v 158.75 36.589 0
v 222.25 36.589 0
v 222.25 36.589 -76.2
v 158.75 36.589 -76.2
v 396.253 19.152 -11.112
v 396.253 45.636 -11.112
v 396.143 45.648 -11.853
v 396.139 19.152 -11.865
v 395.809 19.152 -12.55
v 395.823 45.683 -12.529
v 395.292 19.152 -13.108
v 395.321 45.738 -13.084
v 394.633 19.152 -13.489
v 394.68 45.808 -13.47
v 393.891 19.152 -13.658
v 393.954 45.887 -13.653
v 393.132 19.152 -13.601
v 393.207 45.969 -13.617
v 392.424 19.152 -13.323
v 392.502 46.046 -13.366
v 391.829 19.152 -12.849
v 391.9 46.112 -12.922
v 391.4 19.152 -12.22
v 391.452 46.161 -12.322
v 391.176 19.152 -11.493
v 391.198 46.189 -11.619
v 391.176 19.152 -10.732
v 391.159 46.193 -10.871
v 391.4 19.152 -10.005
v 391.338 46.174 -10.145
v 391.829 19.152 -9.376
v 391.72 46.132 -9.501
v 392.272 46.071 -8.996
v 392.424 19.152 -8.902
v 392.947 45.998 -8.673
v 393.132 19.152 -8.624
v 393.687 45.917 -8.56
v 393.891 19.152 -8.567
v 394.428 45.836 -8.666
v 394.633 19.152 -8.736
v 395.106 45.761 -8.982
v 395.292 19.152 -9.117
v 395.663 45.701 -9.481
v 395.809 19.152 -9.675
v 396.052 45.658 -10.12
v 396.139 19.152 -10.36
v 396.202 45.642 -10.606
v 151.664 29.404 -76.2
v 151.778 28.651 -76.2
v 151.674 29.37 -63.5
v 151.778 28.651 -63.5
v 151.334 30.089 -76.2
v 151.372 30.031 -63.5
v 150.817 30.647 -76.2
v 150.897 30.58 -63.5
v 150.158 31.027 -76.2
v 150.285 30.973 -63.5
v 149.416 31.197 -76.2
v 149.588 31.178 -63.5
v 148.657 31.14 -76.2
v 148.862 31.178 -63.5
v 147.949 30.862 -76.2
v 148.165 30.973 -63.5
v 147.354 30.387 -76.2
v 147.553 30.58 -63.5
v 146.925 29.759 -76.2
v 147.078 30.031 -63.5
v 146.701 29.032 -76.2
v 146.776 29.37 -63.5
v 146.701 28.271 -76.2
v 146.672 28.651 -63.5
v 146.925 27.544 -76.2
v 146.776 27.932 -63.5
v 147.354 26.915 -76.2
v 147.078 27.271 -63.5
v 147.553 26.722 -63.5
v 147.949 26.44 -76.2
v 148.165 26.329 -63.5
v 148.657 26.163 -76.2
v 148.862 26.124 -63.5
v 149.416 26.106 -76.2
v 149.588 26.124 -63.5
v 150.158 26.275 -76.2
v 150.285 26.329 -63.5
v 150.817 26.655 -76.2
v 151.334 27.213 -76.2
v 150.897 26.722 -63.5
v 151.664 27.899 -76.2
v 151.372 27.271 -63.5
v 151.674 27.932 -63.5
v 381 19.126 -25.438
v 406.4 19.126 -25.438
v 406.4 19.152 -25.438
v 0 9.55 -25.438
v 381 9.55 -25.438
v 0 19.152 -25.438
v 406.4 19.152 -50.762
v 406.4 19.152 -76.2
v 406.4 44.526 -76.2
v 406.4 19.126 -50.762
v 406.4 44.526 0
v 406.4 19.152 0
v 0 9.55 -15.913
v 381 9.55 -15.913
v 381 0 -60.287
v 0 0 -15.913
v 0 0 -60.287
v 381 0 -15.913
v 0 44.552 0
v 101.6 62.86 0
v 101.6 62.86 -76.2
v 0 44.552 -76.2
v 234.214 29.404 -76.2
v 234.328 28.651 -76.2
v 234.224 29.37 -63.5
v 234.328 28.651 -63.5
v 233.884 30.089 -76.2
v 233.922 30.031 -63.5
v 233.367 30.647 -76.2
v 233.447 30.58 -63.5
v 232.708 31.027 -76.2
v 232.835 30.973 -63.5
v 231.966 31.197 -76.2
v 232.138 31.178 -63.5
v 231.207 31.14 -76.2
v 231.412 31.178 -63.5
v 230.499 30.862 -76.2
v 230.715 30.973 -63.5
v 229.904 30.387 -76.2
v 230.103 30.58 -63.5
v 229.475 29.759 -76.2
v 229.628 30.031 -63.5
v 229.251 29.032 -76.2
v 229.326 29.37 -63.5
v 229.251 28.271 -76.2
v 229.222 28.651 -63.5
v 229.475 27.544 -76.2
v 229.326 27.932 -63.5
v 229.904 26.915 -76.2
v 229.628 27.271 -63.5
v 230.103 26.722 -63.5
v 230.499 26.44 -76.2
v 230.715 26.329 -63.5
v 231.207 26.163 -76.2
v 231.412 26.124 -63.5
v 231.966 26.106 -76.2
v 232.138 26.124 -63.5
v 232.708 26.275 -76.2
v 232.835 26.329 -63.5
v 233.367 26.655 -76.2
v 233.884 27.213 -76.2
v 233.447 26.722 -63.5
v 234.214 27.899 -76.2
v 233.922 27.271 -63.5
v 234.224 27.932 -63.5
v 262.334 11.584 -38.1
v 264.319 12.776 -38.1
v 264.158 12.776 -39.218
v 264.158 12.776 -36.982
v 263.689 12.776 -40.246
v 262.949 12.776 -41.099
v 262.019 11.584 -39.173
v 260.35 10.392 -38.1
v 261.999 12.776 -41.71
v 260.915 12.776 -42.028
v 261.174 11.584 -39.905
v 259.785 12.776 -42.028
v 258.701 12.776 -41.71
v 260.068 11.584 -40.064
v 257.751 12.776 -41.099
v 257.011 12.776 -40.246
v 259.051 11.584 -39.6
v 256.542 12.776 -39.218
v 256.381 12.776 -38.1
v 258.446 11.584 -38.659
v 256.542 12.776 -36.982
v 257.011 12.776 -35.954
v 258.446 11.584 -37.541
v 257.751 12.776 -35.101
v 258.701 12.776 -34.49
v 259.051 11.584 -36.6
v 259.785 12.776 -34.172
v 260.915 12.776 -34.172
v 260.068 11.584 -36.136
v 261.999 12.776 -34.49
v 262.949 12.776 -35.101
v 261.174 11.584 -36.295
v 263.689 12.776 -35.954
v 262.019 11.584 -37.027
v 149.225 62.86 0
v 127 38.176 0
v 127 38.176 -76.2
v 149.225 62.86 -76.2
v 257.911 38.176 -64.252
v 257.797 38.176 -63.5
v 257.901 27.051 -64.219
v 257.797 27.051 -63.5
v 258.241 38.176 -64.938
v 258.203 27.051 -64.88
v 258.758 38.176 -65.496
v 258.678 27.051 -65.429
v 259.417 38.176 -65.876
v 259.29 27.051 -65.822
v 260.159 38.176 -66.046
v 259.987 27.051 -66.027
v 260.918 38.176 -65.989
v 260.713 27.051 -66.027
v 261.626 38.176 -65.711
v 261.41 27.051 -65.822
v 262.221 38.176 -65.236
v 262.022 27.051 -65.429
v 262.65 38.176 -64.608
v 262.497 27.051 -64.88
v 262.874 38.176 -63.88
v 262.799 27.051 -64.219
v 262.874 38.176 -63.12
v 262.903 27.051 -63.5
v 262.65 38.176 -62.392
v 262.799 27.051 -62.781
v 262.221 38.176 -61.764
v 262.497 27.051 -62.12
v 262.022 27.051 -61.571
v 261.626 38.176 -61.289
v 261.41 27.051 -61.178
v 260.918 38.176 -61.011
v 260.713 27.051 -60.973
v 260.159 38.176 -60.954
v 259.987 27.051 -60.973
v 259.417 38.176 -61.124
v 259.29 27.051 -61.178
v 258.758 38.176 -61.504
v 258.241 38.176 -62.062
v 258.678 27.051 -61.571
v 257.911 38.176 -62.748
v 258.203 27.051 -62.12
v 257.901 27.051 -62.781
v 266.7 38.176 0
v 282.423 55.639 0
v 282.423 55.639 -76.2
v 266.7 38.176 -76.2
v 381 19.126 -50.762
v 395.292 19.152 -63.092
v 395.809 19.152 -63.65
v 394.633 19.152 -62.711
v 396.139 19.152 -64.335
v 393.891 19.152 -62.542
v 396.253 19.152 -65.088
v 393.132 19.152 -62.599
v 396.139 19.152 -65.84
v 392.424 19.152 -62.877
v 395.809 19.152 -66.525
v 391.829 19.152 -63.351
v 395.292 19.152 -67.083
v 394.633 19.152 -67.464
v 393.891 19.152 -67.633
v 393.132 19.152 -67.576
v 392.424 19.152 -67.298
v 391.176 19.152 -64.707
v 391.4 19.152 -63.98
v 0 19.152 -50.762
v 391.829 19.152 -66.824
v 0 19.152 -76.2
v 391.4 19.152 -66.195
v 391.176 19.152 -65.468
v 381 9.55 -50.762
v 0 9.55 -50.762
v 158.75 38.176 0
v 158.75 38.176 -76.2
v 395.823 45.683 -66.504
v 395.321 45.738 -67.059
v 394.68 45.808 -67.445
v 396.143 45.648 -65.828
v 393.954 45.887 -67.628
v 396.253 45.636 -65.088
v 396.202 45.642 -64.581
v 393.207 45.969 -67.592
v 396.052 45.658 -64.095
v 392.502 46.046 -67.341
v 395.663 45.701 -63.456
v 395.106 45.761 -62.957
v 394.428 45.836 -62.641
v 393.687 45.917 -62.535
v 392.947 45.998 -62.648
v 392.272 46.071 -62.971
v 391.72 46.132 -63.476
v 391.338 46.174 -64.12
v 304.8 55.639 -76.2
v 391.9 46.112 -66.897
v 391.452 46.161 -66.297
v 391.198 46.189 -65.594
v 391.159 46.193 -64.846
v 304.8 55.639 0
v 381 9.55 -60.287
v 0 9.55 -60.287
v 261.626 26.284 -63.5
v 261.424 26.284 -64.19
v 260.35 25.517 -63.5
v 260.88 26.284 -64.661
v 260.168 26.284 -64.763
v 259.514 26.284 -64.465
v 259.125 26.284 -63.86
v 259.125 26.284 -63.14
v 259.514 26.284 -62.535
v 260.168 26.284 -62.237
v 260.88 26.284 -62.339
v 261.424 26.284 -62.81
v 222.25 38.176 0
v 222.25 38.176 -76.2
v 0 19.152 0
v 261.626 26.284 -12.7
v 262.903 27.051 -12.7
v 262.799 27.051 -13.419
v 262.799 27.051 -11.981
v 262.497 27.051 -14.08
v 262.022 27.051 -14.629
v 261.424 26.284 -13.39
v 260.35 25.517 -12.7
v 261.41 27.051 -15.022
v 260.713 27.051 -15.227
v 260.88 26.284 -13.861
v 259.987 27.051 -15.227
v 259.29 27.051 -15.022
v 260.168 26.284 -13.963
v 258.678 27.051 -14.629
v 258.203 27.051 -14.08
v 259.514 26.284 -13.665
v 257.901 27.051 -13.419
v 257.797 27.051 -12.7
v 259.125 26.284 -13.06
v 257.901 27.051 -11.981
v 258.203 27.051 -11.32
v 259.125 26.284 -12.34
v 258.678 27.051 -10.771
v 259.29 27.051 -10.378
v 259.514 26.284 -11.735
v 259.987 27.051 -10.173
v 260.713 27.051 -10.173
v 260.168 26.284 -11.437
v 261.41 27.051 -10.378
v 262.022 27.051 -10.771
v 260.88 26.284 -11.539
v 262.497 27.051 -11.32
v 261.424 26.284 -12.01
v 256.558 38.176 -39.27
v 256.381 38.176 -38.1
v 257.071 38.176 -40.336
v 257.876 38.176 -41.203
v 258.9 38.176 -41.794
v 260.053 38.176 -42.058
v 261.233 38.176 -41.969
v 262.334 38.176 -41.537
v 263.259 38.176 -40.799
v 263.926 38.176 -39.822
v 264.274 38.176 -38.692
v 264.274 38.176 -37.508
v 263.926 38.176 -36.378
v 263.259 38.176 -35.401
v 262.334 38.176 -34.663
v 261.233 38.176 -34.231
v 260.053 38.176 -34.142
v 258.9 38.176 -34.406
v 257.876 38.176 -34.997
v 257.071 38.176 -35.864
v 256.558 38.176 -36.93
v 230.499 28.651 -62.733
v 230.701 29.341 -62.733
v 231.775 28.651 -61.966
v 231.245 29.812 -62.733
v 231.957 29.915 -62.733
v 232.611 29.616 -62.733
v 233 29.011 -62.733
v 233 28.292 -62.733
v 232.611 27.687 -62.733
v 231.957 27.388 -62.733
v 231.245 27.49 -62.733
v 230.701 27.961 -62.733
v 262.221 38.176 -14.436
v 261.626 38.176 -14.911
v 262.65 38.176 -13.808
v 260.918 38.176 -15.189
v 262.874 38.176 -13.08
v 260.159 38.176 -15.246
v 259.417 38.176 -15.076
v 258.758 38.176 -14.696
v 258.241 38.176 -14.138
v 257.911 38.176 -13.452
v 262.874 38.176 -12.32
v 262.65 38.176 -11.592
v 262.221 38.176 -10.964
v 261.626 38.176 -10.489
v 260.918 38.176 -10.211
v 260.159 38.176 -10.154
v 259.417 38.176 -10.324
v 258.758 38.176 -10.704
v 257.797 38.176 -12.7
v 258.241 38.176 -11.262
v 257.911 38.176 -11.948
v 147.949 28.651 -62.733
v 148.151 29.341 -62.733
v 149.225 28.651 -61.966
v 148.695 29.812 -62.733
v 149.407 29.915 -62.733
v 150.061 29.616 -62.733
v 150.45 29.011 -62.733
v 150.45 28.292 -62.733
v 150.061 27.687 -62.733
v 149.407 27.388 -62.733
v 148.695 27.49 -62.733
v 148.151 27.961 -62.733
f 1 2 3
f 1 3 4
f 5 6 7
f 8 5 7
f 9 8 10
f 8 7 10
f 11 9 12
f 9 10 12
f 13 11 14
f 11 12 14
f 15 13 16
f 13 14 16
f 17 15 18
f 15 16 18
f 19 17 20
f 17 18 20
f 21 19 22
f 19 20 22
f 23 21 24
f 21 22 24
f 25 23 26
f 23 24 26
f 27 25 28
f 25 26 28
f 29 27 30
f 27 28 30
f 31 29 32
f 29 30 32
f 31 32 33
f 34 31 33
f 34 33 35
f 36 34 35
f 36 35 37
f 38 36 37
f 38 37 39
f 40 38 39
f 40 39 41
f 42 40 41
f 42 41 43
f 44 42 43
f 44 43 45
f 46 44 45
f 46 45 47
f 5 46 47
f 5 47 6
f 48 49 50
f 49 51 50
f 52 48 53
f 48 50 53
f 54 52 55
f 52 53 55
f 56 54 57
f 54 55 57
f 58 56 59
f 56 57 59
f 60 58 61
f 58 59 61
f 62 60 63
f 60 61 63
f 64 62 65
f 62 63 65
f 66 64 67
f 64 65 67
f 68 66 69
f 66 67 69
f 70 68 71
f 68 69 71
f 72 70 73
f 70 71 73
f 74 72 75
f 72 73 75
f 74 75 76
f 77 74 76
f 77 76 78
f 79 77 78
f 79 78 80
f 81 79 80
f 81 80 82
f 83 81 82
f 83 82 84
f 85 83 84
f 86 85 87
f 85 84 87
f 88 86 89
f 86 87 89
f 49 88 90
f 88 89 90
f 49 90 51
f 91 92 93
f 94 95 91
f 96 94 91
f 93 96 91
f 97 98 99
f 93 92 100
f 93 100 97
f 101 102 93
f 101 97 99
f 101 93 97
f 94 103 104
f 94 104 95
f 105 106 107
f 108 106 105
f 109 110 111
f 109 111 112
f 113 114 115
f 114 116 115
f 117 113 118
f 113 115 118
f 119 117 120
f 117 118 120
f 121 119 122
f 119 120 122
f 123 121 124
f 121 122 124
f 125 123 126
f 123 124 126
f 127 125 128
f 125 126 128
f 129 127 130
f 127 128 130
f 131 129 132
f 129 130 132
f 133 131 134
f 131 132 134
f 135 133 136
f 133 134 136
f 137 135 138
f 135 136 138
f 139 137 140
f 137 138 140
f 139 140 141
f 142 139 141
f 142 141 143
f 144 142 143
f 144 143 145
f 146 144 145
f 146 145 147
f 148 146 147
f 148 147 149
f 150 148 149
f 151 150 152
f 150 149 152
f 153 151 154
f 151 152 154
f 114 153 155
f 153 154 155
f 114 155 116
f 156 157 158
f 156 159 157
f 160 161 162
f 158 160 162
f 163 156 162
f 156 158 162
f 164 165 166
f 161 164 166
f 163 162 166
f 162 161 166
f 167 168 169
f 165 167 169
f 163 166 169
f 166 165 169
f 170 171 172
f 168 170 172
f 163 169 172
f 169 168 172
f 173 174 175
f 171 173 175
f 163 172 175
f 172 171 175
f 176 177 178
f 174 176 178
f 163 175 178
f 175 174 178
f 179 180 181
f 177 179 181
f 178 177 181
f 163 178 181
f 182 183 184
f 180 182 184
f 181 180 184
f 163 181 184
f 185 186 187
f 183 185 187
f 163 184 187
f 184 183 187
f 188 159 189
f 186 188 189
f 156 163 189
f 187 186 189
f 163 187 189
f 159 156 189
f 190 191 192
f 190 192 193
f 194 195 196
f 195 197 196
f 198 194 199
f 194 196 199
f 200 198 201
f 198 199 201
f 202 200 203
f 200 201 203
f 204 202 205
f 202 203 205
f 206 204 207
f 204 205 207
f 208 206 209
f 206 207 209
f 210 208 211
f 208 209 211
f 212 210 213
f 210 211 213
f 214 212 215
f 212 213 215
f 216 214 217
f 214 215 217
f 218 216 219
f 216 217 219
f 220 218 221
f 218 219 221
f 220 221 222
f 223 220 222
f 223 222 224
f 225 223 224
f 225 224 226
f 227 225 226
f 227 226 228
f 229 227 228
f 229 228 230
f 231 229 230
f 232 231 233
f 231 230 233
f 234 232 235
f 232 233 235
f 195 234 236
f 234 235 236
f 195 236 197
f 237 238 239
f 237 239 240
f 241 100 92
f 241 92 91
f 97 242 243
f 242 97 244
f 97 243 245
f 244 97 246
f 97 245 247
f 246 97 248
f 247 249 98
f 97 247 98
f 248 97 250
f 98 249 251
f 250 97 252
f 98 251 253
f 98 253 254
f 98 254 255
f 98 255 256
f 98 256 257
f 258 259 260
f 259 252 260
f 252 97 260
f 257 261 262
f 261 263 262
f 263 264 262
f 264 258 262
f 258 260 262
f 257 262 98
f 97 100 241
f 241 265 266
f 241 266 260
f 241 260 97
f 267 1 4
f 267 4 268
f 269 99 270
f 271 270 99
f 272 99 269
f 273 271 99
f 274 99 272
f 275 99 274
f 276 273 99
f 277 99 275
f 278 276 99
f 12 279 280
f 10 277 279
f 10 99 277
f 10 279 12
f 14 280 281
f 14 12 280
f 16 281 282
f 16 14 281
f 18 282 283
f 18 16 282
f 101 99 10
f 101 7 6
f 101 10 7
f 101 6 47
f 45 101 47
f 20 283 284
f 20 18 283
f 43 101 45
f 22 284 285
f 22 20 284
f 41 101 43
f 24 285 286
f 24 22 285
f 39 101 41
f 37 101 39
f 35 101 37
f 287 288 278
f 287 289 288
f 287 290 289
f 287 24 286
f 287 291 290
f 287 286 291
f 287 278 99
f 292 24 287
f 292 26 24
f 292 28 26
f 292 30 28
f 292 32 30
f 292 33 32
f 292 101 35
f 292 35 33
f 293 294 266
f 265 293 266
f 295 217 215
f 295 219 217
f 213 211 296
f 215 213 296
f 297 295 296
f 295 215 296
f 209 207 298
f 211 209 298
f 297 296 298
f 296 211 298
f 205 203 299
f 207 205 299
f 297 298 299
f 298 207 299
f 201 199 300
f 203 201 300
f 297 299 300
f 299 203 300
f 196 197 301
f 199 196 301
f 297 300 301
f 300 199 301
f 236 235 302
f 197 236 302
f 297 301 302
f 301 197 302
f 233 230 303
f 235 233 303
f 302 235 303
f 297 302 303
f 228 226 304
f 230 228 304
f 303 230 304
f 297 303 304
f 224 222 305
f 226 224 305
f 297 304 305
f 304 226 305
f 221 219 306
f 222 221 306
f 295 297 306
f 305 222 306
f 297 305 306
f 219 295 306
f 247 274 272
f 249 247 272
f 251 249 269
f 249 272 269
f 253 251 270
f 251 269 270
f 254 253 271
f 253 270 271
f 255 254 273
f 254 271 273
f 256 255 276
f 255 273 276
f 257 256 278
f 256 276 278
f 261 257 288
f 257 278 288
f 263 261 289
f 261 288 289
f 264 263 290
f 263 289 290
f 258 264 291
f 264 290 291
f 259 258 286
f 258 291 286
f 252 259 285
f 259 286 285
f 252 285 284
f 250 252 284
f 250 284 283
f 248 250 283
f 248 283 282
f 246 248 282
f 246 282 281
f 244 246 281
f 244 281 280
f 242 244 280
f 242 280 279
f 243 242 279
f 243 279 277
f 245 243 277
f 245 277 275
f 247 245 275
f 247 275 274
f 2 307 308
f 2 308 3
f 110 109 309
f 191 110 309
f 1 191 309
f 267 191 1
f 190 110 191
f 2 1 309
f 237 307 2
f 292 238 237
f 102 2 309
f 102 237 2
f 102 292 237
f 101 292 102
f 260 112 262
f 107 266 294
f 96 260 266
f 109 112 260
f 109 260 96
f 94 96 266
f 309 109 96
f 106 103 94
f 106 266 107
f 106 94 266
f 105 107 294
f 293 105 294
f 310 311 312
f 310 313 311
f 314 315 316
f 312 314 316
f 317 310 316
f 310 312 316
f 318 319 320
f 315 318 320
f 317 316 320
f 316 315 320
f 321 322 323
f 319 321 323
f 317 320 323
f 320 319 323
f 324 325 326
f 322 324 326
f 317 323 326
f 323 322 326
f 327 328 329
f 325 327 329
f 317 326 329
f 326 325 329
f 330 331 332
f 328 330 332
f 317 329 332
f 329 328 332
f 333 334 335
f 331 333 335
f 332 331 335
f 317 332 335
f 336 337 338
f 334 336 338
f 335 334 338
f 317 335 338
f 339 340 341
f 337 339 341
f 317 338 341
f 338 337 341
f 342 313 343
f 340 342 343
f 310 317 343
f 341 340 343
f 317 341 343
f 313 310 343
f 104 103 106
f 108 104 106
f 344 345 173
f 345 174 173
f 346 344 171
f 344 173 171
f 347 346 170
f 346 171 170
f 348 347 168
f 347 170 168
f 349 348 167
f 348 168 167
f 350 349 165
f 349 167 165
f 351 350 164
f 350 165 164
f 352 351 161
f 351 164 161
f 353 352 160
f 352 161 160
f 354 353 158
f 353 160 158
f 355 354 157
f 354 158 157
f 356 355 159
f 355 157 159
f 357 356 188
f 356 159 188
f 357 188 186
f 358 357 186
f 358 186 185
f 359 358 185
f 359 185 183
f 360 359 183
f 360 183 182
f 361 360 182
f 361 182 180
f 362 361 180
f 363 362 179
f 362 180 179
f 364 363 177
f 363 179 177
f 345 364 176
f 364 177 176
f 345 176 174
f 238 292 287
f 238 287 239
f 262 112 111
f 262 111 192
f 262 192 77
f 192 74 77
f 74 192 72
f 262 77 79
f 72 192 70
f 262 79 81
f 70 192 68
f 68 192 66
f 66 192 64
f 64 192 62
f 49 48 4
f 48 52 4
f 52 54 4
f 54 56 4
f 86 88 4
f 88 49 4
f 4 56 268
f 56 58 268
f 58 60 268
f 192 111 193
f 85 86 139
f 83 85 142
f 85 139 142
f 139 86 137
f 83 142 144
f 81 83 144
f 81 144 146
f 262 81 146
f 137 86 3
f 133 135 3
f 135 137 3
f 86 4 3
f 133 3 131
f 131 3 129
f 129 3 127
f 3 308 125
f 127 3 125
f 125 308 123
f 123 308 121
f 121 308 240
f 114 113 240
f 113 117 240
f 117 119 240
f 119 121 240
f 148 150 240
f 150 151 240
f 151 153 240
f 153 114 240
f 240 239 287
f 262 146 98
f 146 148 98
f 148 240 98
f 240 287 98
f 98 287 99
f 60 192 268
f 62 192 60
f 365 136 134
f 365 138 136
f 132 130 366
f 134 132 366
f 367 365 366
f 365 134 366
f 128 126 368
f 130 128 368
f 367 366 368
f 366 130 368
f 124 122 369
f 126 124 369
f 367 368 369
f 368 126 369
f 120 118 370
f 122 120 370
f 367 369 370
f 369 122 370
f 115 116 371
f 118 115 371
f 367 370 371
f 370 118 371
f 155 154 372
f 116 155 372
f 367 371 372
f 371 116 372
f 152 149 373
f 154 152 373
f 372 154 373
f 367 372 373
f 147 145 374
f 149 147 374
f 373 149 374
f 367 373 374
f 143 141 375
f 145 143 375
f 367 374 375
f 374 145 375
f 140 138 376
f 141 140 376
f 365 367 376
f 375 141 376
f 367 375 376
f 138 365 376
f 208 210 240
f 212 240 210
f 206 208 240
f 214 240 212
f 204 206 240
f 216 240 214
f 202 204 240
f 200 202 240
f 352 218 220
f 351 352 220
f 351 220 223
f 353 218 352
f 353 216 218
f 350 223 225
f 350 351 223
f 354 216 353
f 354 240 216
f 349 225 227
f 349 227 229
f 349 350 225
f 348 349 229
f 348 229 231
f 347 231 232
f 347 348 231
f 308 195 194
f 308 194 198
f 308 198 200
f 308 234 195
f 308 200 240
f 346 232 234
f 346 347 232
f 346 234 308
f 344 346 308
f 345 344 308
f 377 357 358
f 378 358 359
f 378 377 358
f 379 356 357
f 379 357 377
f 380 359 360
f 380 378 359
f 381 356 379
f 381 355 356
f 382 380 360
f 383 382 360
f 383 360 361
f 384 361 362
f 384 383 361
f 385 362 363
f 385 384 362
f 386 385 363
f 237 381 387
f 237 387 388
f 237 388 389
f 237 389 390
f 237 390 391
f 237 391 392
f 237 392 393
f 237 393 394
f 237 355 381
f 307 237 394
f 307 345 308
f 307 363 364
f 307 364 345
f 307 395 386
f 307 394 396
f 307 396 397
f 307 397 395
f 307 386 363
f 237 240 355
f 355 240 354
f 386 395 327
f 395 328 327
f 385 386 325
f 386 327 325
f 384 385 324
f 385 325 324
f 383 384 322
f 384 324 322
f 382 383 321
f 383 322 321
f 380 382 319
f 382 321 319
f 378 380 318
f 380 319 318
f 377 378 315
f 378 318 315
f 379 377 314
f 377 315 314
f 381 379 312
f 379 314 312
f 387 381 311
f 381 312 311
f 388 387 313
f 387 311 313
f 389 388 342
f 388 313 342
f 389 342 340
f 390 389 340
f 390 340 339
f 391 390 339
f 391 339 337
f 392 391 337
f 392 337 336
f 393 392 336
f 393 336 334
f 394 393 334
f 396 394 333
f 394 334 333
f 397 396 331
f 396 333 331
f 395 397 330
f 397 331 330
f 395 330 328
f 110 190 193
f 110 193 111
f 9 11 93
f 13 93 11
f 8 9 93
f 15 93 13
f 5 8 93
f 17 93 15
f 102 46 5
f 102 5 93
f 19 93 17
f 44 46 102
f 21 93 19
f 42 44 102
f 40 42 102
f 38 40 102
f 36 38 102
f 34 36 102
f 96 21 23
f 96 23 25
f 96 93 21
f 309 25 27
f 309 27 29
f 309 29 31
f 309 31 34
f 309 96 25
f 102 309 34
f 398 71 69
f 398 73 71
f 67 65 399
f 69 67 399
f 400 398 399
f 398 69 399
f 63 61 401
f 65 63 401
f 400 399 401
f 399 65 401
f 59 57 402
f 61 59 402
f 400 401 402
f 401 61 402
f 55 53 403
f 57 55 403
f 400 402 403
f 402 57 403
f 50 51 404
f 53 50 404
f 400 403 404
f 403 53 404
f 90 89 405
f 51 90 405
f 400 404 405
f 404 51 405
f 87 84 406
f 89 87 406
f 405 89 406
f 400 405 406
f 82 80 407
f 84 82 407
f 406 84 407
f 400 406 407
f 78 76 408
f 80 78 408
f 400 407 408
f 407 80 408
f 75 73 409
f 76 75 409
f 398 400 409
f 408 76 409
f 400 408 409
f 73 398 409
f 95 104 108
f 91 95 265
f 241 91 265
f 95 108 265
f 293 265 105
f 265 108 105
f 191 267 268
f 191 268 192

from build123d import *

# Parameters (mm, degrees)
BOSS_EXTRUDE1_DEPTH         = 76.2
SKETCH4_W                   = 25.4
SKETCH4_H                   = 76.2
CUT_EXTRUDE2_DEPTH          = 19.1262
CUT_EXTRUDE9_DEPTH          = 419.232859396
F_1_4_20_TAPPED_HOLE1_D     = 5.1054
F_1_4_20_TAPPED_HOLE1_DEPTH = 12.7
F_1_4_20_TAPPED_HOLE1_TIP   = 1.533816902
F_3_8_16_TAPPED_HOLE1_D     = 7.9375
F_3_8_16_TAPPED_HOLE1_DEPTH = 25.4
F_3_8_16_TAPPED_HOLE1_TIP   = 2.384665582
F_1_4_20_TAPPED_HOLE2_D     = 5.1054
F_1_4_20_TAPPED_HOLE2_DEPTH = 11.1252
F_1_4_20_TAPPED_HOLE2_TIP   = 1.533816902
F_1_4_20_TAPPED_HOLE3_D     = 5.1054


with BuildPart() as part:
    # Sketch2 → Boss-Extrude1 (new body)
    with BuildSketch(Plane.XY):
        Polygon((0, 0), (406.4, 0), (406.4, 44.5262), (304.8, 55.6387), (282.423305624, 55.6387), (266.7, 38.1762), (222.25, 38.1762), (222.25, 36.5887), (158.75, 36.5887), (158.75, 38.1762), (127, 38.1762), (149.225, 62.859563142), (101.6, 62.859563142), (0, 44.5516), align=None)
    extrude(amount=-BOSS_EXTRUDE1_DEPTH)

    # Sketch4 → Cut-Extrude2 (cut)
    with BuildSketch(Plane(origin=(0, 0, 0), x_dir=(-1, 0, 0), z_dir=(0, -1, 0))):
        with Locations((-393.7, 38.1)):
            Rectangle(SKETCH4_W, SKETCH4_H)
    extrude(amount=-CUT_EXTRUDE2_DEPTH, mode=Mode.SUBTRACT)

    # Sketch7 → Cut-Extrude9 (cut, through all)
    with BuildSketch(Plane.ZY):
        Polygon((-76.2, 19.1516), (-76.2, -1.27), (-60.2869, -1.27), (-60.2869, 0.0254), (-60.2869, 9.5504), (-50.7619, 9.5504), (-50.7619, 19.1516), align=None)
        Polygon((-15.9131, 0.0254), (-15.9131, 9.5504), (-25.4381, 9.5504), (-25.4381, 19.1516), (0, 19.1516), (0, -1.27), (-15.9131, -1.27), align=None)
    extrude(amount=-CUT_EXTRUDE9_DEPTH, mode=Mode.SUBTRACT)

    # 1/4-20 Tapped Hole1
    with Locations(Plane(origin=(0, 0, -76.2), x_dir=(-1, 0, 0), z_dir=(0, 0, -1))):
        with Locations((-149.225, 28.6512), (-231.775, 28.6512)):
            Hole(F_1_4_20_TAPPED_HOLE1_D / 2, depth=F_1_4_20_TAPPED_HOLE1_DEPTH)
            with Locations((0, 0, -(F_1_4_20_TAPPED_HOLE1_DEPTH + F_1_4_20_TAPPED_HOLE1_TIP / 2))):  # 118° drill point
                Cone(0, F_1_4_20_TAPPED_HOLE1_D / 2, F_1_4_20_TAPPED_HOLE1_TIP, mode=Mode.SUBTRACT)

    # 3/8-16 Tapped Hole1
    with Locations(Plane(origin=(0, 38.1762, 0), x_dir=(1, 0, 0), z_dir=(0, 1, 0))):
        with Locations((260.35, 38.1)):
            Hole(F_3_8_16_TAPPED_HOLE1_D / 2, depth=F_3_8_16_TAPPED_HOLE1_DEPTH)
            with Locations((0, 0, -(F_3_8_16_TAPPED_HOLE1_DEPTH + F_3_8_16_TAPPED_HOLE1_TIP / 2))):  # 118° drill point
                Cone(0, F_3_8_16_TAPPED_HOLE1_D / 2, F_3_8_16_TAPPED_HOLE1_TIP, mode=Mode.SUBTRACT)

    # 1/4-20 Tapped Hole2
    with Locations(Plane(origin=(0, 38.1762, 0), x_dir=(1, 0, 0), z_dir=(0, 1, 0))):
        with Locations((260.35, 63.5), (260.35, 12.7)):
            Hole(F_1_4_20_TAPPED_HOLE2_D / 2, depth=F_1_4_20_TAPPED_HOLE2_DEPTH)
            with Locations((0, 0, -(F_1_4_20_TAPPED_HOLE2_DEPTH + F_1_4_20_TAPPED_HOLE2_TIP / 2))):  # 118° drill point
                Cone(0, F_1_4_20_TAPPED_HOLE2_D / 2, F_1_4_20_TAPPED_HOLE2_TIP, mode=Mode.SUBTRACT)

    # 1/4-20 Tapped Hole3 (through all)
    with Locations(Plane(origin=(0, 19.1516, 0), x_dir=(-1, 0, 0), z_dir=(0, -1, 0))):
        with Locations((-393.7, 11.1125), (-393.7, 65.0875)):
            Hole(F_1_4_20_TAPPED_HOLE3_D / 2)


solid = part.part
